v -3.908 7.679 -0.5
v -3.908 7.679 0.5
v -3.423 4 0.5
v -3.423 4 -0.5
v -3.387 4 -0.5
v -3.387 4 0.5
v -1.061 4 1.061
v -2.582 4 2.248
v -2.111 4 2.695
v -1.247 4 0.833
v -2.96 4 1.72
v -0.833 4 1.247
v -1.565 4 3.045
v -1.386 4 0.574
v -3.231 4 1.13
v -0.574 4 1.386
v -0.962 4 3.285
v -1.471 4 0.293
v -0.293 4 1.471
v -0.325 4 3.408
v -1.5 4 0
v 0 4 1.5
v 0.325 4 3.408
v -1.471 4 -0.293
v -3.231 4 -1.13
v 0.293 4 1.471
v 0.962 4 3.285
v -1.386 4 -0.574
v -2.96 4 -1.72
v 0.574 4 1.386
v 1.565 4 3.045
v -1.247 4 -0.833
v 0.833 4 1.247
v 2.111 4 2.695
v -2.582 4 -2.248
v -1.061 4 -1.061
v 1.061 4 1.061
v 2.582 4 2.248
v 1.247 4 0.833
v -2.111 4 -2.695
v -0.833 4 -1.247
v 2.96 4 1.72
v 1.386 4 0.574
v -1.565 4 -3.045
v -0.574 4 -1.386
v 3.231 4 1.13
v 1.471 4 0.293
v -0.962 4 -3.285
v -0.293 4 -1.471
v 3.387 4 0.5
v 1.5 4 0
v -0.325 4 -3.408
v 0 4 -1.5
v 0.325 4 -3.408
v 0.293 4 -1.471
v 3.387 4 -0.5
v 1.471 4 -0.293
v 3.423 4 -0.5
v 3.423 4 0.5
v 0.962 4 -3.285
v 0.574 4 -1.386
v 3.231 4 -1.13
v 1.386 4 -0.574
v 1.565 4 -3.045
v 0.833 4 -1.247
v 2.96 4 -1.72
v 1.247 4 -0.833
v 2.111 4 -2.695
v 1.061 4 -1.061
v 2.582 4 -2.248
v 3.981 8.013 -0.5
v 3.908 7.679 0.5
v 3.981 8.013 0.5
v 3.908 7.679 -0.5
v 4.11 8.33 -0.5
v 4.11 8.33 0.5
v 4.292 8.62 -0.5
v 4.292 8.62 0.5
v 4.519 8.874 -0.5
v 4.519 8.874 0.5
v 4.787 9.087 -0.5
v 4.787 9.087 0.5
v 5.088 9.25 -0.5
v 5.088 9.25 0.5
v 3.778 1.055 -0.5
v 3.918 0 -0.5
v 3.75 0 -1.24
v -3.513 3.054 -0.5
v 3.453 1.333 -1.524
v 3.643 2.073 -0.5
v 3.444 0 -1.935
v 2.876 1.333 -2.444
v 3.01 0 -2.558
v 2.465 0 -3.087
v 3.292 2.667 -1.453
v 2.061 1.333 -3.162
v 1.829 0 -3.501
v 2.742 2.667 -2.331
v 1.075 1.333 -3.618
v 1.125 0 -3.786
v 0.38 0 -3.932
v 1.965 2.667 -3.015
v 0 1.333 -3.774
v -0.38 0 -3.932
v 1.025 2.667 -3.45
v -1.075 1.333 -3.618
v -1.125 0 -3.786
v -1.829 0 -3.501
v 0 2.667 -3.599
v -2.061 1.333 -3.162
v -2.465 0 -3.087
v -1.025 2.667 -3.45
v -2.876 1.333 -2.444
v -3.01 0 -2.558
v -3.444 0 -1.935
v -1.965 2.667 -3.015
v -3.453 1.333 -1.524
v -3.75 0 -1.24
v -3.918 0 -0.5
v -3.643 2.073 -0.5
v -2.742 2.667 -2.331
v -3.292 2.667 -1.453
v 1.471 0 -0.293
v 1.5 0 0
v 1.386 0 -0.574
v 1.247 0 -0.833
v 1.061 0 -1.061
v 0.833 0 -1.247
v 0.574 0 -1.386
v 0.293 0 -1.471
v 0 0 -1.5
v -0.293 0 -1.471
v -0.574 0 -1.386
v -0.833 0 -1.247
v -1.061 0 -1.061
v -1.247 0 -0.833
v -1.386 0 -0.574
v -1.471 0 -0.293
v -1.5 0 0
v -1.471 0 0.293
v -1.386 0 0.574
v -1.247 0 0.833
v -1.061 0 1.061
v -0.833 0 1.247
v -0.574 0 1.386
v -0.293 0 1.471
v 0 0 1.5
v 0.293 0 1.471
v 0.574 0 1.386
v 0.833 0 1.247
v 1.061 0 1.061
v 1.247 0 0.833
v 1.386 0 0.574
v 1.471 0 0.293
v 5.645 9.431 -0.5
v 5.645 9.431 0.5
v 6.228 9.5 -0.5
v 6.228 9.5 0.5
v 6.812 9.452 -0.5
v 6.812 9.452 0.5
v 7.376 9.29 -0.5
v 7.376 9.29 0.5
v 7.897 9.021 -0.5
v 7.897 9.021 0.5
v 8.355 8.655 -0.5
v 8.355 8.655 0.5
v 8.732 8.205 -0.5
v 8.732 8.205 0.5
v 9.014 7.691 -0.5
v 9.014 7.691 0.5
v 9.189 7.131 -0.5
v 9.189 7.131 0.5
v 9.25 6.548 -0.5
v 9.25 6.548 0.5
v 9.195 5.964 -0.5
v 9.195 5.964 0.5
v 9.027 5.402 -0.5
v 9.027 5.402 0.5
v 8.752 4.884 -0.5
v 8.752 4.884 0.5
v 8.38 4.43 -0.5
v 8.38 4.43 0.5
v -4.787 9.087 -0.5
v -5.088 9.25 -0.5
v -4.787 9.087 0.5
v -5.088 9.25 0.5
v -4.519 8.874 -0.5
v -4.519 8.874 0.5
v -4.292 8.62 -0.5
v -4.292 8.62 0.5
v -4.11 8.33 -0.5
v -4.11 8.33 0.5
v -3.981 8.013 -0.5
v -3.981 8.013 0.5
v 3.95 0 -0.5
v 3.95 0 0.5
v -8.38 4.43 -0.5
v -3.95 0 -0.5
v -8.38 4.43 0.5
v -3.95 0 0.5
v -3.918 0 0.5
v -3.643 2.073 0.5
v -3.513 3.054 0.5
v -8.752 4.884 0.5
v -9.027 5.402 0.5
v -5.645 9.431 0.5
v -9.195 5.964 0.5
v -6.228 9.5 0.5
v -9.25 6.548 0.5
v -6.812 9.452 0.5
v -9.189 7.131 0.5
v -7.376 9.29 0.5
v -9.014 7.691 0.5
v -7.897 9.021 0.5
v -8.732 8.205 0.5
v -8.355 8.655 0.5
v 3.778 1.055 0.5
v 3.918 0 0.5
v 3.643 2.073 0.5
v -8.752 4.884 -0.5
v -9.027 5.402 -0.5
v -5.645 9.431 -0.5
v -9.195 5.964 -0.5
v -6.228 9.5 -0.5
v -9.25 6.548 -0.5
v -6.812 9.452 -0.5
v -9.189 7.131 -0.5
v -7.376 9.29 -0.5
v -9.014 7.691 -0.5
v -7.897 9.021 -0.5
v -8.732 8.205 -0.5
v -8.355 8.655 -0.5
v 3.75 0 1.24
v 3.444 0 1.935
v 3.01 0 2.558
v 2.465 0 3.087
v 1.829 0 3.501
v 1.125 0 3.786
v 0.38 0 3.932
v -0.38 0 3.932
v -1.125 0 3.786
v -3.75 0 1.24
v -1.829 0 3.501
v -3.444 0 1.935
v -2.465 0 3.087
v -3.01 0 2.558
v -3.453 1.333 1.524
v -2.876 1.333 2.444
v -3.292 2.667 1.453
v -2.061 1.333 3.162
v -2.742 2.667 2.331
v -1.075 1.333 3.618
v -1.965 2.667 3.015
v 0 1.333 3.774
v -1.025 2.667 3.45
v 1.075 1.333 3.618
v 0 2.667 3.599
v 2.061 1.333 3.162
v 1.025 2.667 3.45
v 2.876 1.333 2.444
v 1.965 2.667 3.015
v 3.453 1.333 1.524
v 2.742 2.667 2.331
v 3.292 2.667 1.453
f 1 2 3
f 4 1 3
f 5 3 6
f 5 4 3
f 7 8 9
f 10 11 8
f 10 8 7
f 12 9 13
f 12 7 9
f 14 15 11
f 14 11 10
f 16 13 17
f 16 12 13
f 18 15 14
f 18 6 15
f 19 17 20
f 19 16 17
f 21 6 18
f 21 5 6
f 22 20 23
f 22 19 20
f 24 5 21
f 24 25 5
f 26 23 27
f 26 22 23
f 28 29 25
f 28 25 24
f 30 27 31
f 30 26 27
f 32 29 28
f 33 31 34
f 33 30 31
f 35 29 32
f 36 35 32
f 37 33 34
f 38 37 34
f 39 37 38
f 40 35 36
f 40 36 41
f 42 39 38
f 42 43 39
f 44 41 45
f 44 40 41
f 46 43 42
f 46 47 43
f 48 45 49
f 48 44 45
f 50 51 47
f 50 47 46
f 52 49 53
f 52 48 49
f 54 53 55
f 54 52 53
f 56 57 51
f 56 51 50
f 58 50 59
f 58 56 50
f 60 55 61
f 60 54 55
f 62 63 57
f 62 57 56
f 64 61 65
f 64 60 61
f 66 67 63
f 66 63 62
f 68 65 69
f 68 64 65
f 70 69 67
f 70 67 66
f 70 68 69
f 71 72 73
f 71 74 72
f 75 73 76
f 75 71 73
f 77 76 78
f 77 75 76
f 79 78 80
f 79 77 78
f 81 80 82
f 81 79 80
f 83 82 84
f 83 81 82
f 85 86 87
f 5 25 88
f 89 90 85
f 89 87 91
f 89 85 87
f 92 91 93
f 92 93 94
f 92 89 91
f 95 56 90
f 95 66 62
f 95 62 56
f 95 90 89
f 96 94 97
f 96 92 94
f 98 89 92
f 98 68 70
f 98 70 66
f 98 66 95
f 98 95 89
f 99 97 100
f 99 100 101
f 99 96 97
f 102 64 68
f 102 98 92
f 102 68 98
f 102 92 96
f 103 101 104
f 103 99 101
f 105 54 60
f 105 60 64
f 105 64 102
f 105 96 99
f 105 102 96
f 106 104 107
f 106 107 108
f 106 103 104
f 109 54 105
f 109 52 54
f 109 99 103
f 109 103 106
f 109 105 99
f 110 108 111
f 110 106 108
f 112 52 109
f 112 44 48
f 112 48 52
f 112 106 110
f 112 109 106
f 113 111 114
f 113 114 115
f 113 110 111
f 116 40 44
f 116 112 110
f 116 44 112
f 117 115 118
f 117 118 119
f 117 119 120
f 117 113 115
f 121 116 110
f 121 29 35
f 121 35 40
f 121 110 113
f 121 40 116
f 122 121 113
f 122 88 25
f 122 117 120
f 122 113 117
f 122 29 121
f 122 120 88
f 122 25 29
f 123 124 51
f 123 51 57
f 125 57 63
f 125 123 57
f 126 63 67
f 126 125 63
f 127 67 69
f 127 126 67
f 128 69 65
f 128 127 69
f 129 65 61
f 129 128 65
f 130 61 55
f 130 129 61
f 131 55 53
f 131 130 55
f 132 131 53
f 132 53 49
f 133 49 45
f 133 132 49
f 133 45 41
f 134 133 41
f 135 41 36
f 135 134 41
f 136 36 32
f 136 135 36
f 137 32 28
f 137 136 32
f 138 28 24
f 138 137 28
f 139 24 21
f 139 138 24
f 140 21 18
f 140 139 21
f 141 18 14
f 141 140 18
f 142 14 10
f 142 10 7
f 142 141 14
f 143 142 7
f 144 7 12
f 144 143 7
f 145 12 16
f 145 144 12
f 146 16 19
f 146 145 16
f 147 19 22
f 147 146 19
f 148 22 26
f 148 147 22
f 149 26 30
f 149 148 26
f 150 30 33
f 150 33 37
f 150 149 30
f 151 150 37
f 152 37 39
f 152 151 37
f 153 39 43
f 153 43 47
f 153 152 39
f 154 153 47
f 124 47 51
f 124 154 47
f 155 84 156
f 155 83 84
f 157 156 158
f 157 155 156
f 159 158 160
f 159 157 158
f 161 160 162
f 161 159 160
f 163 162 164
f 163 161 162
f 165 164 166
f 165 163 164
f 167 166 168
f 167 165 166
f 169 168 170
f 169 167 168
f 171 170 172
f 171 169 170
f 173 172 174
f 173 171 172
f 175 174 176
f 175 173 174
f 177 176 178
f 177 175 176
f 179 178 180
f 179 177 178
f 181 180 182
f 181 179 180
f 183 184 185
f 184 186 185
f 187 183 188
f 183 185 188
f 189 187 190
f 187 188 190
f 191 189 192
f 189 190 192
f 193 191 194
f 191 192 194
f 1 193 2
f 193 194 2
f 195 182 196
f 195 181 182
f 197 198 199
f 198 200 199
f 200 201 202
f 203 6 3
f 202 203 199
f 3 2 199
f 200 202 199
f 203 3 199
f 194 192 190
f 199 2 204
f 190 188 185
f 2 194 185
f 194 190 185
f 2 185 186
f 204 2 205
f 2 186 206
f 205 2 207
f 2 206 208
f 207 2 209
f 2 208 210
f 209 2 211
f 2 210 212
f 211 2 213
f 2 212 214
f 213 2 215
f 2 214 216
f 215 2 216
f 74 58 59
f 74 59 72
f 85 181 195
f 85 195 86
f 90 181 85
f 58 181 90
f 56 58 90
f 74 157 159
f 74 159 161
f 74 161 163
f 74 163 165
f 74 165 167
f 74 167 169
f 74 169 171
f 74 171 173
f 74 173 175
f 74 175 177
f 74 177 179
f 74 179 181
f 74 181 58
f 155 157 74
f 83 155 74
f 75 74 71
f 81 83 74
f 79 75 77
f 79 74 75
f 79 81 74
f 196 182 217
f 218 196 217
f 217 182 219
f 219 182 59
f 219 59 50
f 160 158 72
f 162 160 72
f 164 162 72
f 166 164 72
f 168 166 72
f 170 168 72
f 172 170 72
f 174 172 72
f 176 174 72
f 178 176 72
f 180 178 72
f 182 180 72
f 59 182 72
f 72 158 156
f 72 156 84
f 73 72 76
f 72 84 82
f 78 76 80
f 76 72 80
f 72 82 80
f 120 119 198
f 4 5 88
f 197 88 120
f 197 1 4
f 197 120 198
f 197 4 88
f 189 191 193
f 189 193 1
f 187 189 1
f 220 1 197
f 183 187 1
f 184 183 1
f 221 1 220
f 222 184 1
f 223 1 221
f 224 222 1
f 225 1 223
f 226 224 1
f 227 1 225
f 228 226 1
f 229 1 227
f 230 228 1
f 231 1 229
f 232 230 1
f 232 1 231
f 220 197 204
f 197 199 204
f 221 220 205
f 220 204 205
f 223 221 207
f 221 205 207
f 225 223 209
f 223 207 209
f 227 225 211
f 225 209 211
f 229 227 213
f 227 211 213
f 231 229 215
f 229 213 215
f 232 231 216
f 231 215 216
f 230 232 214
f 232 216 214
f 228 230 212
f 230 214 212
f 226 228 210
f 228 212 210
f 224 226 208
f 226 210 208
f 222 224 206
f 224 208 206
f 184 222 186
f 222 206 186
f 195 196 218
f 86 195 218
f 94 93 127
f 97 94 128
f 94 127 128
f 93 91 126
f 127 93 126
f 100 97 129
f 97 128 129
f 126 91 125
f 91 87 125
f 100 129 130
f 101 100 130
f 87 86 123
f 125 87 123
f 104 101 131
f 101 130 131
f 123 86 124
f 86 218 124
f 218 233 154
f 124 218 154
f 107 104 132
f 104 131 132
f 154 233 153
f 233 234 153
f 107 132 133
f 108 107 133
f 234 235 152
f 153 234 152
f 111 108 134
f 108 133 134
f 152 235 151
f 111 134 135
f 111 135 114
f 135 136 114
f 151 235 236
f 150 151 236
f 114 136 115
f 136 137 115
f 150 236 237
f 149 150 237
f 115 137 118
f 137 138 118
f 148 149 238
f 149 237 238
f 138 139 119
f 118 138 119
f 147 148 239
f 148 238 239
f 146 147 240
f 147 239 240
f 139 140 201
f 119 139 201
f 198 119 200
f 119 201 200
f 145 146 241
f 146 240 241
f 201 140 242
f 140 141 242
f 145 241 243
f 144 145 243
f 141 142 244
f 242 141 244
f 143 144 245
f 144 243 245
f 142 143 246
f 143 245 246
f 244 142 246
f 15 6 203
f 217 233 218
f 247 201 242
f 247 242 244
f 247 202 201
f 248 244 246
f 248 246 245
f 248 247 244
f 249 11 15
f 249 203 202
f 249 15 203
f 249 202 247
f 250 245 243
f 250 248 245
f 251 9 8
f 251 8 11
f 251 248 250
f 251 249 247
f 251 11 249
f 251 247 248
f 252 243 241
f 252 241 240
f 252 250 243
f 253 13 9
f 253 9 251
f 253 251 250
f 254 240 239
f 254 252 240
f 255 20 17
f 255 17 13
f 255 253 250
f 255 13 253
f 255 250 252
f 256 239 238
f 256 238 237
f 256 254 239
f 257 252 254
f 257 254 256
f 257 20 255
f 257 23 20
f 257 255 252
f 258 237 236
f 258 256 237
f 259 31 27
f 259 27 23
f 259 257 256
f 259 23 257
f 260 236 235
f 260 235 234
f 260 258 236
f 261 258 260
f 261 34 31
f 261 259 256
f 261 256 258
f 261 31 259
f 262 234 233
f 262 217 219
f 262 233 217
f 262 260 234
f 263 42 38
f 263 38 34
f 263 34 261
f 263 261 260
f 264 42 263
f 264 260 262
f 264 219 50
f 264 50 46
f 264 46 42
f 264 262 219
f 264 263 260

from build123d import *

# Parameters (mm, degrees)
SKETCH_1_R          = 3.95
EXTRUDE_1_DEPTH     = 4
EXTRUDE_1_TAPER     = 7.5
SKETCH_2_R          = 1.5
CUT_EXTRUDE_1_DEPTH = 4
EXTRUDE_2_DEPTH     = 0.5


with BuildPart() as part:
    # 草图1 → 凸台-拉伸1 (new body)
    with BuildSketch(Plane(origin=(0, 0, 0), x_dir=(1, 0, 0), z_dir=(0, 1, 0))):
        Circle(SKETCH_1_R)
    extrude(amount=EXTRUDE_1_DEPTH, taper=EXTRUDE_1_TAPER)

    # 草图2 → 切除-拉伸1 (cut)
    with BuildSketch(Plane(origin=(0, 0, 0), x_dir=(1, 0, 0), z_dir=(0, 1, 0))):
        Circle(SKETCH_2_R)
    extrude(amount=CUT_EXTRUDE_1_DEPTH, mode=Mode.SUBTRACT)

    # 草图3 → 凸台-拉伸2 (add, symmetric)
    with BuildSketch(Plane.XY):
        with BuildLine():
            Line((8.380151519, 4.430151519), (3.95, 0))
            Line((3.95, 0), (1.95, 0))
            Line((1.95, 0), (1.95, 4))
            Line((1.95, 4), (3.42339001, 4))
            Line((3.42339001, 4), (3.907794349, 7.679416256))
            ThreePointArc((3.907794349, 7.679416256), (4.291558837, 8.619529341), (5.087532952, 9.250015662))
            ThreePointArc((5.087532952, 9.250015662), (8.73241738, 8.205380502), (8.380151519, 4.430151519))
        make_face()
        with BuildLine():
            Line((-1.95, 4), (-1.95, 0))
            Line((-1.95, 0), (-3.95, 0))
            Line((-3.95, 0), (-8.380151519, 4.430151519))
            ThreePointArc((-8.380151519, 4.430151519), (-8.73241738, 8.205380502), (-5.087532952, 9.250015662))
            ThreePointArc((-5.087532952, 9.250015662), (-4.291558837, 8.619529341), (-3.907794349, 7.679416256))
            Line((-3.907794349, 7.679416256), (-3.42339001, 4))
            Line((-3.42339001, 4), (-1.95, 4))
        make_face()
    extrude(amount=EXTRUDE_2_DEPTH, both=True)


solid = part.part
